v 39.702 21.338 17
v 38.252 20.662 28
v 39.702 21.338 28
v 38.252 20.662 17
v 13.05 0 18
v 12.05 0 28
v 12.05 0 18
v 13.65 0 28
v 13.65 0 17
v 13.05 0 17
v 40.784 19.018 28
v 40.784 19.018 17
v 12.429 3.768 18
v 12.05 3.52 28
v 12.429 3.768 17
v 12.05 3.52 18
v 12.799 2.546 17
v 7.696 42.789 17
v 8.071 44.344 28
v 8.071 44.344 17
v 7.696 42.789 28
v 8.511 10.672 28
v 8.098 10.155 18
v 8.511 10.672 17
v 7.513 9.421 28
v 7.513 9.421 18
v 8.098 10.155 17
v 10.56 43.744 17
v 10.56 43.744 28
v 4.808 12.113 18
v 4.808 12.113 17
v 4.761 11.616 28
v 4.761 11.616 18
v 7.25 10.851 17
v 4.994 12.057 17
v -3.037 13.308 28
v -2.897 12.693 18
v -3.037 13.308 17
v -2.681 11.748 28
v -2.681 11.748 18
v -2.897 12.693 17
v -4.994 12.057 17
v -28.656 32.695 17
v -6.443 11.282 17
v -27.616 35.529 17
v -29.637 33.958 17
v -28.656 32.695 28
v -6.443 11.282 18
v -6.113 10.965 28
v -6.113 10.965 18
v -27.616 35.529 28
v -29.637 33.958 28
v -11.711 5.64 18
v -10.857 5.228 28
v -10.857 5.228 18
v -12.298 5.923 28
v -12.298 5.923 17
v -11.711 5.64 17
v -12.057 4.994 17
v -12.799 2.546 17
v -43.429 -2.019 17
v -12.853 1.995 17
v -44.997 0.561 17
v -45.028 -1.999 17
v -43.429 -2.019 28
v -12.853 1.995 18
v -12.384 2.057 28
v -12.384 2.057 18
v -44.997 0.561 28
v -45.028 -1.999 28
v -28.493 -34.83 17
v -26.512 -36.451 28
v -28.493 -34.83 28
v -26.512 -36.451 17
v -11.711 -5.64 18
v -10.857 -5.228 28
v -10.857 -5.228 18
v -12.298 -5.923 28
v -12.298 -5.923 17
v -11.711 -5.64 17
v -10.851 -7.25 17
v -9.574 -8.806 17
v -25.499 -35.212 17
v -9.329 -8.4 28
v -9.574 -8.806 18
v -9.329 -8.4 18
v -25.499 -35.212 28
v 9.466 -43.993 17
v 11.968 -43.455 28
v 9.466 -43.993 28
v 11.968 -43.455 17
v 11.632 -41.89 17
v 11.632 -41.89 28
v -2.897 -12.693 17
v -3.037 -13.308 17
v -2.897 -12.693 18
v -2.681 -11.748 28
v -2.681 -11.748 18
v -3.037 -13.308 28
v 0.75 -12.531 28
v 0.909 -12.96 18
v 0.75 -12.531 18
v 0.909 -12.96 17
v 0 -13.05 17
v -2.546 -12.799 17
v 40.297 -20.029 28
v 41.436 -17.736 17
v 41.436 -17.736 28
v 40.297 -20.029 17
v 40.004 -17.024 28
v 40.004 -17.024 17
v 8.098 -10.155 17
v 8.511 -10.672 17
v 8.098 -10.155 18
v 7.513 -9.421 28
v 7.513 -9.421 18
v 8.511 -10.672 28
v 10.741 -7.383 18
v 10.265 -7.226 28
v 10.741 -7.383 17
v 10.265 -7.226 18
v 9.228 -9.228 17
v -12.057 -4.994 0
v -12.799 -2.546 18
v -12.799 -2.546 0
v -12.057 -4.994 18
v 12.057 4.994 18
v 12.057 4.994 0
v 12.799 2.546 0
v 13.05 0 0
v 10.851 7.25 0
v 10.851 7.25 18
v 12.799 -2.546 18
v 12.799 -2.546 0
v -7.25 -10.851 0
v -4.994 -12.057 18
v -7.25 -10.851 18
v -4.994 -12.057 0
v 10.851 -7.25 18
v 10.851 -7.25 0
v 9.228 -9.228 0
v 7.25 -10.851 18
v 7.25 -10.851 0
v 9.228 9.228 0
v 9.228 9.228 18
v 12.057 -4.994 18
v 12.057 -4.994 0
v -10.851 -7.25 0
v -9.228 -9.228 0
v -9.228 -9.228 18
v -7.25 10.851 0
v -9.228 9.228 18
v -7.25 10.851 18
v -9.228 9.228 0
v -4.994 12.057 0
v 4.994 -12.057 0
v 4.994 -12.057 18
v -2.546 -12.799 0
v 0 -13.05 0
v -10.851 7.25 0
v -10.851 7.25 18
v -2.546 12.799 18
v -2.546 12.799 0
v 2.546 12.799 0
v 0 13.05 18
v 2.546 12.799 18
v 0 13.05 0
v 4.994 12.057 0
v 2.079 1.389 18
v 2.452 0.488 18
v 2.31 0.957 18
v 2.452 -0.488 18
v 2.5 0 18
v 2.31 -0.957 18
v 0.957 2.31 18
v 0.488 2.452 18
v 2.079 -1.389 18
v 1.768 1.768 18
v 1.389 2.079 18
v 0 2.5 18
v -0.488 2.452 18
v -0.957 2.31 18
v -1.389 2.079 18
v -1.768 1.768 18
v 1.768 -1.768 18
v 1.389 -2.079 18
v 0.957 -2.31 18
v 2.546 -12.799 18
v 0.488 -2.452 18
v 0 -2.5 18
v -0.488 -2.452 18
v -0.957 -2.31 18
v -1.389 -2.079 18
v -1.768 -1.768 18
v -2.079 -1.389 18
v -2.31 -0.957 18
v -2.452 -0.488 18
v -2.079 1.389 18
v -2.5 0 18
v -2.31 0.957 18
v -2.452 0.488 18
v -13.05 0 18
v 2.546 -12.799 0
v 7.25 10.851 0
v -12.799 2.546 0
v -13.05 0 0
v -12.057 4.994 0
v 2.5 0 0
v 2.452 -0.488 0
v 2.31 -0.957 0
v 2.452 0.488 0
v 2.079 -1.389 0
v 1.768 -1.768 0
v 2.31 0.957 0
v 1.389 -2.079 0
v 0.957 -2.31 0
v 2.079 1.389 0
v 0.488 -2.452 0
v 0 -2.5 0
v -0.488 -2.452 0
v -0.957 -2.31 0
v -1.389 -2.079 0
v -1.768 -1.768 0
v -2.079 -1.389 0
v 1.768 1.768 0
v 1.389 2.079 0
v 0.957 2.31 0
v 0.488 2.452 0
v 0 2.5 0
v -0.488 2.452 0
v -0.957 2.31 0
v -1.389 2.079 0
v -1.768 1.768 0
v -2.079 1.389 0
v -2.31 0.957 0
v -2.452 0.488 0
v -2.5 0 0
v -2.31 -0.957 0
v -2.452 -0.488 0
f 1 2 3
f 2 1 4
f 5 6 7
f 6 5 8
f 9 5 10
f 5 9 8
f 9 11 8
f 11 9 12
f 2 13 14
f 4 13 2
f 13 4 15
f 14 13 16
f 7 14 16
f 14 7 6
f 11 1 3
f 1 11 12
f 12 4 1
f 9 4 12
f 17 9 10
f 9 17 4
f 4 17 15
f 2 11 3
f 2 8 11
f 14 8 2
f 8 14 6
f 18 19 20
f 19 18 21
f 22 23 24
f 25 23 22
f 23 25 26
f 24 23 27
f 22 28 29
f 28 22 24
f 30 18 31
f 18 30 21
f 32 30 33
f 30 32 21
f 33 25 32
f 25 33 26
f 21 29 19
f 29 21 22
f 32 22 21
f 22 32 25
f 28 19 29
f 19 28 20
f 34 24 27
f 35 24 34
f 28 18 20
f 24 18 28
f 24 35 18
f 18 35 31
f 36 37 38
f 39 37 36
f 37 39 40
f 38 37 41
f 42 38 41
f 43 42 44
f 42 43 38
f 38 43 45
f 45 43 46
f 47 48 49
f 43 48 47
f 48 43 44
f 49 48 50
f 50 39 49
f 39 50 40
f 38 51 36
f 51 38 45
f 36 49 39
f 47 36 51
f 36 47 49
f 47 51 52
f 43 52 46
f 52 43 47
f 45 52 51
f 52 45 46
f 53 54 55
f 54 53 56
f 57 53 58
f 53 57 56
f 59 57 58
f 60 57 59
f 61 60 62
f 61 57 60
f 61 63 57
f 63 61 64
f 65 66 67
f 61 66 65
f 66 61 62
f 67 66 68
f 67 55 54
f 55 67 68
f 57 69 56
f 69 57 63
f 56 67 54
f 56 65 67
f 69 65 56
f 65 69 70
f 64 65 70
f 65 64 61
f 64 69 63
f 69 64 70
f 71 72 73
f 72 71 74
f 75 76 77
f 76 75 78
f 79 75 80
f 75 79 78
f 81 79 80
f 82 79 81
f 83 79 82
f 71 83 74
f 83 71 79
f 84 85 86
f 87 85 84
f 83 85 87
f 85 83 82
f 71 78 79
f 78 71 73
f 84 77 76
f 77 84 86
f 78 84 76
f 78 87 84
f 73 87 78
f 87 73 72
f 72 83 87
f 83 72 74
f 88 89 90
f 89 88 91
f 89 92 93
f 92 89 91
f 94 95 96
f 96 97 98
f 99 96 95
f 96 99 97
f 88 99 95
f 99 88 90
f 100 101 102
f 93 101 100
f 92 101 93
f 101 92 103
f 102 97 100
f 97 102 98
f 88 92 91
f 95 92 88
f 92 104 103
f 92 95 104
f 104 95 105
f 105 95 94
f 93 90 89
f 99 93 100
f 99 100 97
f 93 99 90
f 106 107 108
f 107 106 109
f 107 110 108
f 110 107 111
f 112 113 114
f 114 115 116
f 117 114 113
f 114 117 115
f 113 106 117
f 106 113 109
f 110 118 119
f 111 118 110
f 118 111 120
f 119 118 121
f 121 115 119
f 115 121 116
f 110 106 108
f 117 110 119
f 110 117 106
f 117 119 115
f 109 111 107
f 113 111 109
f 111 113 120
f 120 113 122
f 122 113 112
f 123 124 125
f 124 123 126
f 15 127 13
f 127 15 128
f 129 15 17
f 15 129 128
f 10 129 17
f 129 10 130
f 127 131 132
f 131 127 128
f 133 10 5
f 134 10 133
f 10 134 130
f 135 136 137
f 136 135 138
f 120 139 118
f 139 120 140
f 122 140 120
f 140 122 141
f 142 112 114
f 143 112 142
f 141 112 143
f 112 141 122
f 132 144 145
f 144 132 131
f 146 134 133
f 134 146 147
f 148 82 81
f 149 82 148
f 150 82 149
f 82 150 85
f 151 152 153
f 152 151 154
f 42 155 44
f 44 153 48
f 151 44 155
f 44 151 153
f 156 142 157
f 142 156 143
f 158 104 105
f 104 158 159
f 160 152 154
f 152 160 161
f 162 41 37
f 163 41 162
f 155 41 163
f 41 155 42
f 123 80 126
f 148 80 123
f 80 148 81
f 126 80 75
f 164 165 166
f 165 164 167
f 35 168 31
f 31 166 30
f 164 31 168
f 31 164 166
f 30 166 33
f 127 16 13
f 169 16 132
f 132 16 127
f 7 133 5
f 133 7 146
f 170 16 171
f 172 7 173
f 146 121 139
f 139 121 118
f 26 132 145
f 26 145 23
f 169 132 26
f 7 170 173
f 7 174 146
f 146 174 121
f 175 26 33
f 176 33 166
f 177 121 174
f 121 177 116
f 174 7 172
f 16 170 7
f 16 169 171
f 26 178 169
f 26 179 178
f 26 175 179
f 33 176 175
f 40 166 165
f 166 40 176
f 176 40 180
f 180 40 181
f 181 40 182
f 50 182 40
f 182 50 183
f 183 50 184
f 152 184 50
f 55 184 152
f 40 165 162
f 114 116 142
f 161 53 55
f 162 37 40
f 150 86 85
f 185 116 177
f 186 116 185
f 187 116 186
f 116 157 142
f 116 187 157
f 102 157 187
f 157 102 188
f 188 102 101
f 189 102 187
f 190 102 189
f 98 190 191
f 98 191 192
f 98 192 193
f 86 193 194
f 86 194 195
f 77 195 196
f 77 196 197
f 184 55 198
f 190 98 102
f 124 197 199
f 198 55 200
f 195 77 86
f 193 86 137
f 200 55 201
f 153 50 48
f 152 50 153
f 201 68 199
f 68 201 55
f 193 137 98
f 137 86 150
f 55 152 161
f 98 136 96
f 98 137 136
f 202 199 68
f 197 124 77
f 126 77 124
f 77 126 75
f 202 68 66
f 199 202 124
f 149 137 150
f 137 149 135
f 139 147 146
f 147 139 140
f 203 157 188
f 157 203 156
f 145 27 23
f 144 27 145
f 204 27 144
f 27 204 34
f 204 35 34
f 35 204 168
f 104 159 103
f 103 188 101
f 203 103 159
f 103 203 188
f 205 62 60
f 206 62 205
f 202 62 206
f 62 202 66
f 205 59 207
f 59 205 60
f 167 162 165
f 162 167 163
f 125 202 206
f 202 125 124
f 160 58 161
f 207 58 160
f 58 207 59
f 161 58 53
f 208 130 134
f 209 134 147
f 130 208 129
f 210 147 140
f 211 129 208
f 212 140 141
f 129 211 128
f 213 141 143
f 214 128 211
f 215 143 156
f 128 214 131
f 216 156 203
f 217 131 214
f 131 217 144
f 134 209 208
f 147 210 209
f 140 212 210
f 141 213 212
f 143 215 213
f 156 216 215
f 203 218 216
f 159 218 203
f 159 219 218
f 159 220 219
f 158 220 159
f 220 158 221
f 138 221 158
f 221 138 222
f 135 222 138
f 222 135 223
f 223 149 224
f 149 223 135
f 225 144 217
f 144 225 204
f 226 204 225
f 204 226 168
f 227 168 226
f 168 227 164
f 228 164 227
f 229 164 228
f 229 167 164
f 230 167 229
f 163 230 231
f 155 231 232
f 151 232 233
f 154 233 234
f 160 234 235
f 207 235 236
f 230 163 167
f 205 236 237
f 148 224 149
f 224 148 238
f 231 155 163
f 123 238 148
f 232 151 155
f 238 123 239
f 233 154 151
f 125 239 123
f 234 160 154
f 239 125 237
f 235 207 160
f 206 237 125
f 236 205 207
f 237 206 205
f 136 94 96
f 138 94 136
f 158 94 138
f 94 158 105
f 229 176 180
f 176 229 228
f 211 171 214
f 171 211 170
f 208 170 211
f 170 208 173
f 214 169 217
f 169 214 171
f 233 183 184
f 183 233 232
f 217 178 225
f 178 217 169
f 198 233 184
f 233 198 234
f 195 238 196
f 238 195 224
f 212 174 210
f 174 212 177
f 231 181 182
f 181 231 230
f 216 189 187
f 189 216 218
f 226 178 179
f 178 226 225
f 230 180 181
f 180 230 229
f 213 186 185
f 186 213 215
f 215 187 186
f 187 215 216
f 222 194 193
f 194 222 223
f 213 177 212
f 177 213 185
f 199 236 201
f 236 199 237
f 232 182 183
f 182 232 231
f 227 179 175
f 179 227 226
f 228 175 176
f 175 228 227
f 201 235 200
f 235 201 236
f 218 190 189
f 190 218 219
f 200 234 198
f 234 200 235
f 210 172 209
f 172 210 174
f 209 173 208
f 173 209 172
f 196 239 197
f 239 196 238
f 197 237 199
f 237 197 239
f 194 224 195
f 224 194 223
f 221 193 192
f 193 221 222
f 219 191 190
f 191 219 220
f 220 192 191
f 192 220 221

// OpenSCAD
$fn = 32;

// ----------------------------------------------------------------------
// Impeller: 90 mm, 7 blades, 28 mm tall
// ----------------------------------------------------------------------

// --- parameters (mm) ---
boss_d = 26.1;            // hub diameter
boss_h = 18;              // hub height
rotor_d = 90;             // outer diameter over the blades
vane_count = 7;           // number of blades
blade_t = 1.6;            // blade thickness
blade_h = 10;             // blade height
blade_in_r = 12.05;       // blade root radius
blade_out_r = 43.4;       // blade tip radius
sweep = 25;               // blade sweep, degrees
bore_d = 5;               // shaft bore

module hub() {
  cylinder(h = boss_h, d = boss_d);
}

module blade() {
  /* blade swept between two boxes: hull of the root and the tip section */
  hull() {
    translate([blade_in_r, 0, boss_h - 1])
      cube([blade_t, blade_t * 2.2, blade_h + 1], center = false);
    rotate([0, 0, sweep])
      translate([blade_out_r, 0, boss_h - 1])
        cube([blade_t, blade_t * 1.6, blade_h + 1], center = false);
  }
}

module blades() {
  for (i = [0 : vane_count - 1])
    rotate([0, 0, i * 360 / vane_count]) blade();
}

difference() {
  union() {
    hub();
    blades();
  }
  translate([0, 0, -1]) cylinder(h = boss_h + blade_h + 0 + 3, d = bore_d);
}
